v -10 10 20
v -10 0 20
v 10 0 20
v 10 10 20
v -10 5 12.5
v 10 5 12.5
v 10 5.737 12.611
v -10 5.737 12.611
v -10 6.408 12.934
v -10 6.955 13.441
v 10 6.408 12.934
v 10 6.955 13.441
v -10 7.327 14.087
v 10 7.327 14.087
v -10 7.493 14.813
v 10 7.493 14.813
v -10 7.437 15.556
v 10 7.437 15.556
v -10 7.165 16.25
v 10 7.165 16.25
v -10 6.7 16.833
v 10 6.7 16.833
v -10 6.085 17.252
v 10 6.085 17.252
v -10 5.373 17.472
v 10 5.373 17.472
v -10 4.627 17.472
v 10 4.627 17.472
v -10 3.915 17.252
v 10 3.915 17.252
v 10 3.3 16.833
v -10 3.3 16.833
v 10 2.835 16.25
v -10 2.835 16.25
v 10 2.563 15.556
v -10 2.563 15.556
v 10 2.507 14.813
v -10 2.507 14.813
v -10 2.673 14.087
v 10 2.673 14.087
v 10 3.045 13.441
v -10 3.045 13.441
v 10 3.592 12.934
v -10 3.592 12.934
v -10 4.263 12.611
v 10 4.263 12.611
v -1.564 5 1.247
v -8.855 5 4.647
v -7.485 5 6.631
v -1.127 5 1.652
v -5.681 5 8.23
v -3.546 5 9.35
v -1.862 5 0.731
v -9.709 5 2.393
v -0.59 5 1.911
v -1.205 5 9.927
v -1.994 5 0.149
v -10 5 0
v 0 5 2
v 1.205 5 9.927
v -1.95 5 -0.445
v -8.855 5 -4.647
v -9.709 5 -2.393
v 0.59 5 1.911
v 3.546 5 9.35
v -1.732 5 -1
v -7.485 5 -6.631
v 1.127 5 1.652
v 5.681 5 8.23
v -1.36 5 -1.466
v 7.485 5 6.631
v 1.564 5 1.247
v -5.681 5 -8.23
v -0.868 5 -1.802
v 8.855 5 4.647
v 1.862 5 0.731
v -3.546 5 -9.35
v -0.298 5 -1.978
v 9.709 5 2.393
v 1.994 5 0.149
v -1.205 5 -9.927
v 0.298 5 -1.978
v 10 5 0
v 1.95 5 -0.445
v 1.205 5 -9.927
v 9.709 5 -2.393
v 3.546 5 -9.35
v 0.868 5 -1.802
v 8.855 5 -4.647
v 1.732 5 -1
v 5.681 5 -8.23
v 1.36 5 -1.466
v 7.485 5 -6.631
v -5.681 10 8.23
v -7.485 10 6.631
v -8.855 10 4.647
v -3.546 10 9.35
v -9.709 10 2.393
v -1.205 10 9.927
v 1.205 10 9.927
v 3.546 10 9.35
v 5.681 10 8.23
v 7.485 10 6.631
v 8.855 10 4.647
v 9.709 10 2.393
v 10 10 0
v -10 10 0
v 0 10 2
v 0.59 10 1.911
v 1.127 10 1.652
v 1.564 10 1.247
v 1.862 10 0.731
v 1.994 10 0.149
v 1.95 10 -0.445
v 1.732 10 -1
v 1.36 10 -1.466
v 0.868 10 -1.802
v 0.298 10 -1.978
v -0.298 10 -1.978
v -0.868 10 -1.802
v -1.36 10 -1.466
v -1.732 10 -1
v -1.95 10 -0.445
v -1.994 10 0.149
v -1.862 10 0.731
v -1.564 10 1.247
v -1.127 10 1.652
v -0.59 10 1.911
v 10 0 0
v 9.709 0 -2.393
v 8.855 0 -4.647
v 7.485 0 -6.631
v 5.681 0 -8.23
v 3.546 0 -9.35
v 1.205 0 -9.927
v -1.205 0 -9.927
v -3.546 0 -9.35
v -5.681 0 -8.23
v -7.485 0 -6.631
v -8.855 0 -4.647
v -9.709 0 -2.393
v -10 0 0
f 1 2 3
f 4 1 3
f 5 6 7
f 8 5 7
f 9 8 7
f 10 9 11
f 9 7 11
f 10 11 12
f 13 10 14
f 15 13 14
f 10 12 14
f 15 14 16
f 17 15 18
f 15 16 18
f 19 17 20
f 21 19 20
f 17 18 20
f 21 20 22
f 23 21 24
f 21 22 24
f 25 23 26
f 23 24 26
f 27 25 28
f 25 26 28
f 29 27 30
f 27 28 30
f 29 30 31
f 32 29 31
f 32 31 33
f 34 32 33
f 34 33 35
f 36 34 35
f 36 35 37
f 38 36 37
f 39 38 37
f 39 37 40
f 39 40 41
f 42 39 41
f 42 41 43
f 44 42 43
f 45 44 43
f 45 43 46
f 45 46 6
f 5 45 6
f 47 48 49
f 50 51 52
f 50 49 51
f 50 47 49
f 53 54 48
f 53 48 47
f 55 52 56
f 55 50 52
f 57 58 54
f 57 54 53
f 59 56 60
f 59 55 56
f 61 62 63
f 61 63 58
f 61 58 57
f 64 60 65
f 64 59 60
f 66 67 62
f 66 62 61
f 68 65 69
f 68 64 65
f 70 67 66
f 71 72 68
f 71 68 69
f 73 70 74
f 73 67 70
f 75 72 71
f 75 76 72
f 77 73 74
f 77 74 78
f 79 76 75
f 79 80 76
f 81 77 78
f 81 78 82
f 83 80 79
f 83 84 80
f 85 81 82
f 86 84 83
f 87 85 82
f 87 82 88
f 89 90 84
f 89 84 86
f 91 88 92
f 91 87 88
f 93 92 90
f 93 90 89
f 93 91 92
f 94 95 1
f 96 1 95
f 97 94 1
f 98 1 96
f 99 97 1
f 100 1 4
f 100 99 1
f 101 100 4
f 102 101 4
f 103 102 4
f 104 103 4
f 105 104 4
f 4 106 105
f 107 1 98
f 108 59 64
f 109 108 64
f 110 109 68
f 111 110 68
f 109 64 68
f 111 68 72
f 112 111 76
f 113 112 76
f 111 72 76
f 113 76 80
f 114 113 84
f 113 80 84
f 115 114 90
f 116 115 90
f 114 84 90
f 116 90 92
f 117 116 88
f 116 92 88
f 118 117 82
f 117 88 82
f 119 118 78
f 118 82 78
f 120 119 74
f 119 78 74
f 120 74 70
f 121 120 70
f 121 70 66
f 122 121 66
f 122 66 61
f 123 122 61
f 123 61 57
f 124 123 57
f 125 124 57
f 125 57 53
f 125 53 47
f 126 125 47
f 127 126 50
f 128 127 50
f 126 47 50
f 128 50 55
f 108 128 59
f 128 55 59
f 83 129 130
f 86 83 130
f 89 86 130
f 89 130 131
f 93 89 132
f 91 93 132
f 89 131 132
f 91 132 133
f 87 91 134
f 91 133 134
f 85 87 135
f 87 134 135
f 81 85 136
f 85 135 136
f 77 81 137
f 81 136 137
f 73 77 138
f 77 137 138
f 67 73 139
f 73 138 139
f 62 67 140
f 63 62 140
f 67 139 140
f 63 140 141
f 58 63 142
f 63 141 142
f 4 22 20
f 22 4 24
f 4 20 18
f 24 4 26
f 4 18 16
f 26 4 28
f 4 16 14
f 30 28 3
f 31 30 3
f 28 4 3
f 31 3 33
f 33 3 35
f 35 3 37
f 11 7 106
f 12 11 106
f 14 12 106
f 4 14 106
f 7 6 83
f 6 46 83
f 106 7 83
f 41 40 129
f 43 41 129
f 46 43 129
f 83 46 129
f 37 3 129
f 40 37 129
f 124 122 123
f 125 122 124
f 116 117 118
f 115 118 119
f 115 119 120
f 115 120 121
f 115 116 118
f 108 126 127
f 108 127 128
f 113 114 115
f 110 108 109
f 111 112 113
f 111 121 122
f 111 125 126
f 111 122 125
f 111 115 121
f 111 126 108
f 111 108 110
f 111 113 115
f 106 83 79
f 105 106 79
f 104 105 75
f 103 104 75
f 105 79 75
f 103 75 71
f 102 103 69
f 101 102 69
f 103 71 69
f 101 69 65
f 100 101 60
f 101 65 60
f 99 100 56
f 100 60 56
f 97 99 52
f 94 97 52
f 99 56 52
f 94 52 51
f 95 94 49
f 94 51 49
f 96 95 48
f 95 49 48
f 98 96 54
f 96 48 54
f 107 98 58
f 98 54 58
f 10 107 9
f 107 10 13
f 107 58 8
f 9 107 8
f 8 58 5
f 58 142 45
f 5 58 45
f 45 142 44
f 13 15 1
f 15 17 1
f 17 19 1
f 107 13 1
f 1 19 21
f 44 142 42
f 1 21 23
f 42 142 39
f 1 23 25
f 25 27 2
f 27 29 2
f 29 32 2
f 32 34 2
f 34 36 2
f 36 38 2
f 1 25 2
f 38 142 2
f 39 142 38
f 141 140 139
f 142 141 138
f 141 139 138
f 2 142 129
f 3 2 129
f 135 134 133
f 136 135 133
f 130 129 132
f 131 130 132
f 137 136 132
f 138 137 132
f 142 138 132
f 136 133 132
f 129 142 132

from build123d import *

# Parameters (mm, degrees)
AUFSATZ_LINEAR_AUSTRAGEN1_DEPTH = 5
SKIZZE2_R                       = 2
AUFSATZ_LINEAR_AUSTRAGEN2_DEPTH = 5
SKIZZE3_R                       = 2.5
SCHNITT_LINEAR_AUSTRAGEN1_DEPTH = 31


with BuildPart() as part:
    # Skizze1 → Aufsatz-Linear austragen1 (new body)
    with BuildSketch(Plane(origin=(0, 0, 0), x_dir=(1, 0, 0), z_dir=(0, 1, 0))):
        with BuildLine():
            ThreePointArc((10, 0), (0, 10), (-10, 0))
            Line((-10, 0), (10, 0))
        make_face()
        with BuildLine():
            Line((10, 0), (-10, 0))
            ThreePointArc((-10, 0), (0, -10), (10, 0))
        make_face()
        with BuildLine():
            ThreePointArc((10, 0), (0, 10), (-10, 0))
            Line((-10, 0), (10, 0))
        make_face()
        with BuildLine():
            Line((10, 0), (-10, 0))
            ThreePointArc((-10, 0), (0, -10), (10, 0))
        make_face()
        with BuildLine():
            ThreePointArc((10, 0), (0, -10), (-10, 0))
            Line((-10, 0), (-10, -20))
            Line((-10, -20), (10, -20))
            Line((10, -20), (10, 0))
        make_face()
    extrude(amount=AUFSATZ_LINEAR_AUSTRAGEN1_DEPTH)

    # Skizze2 → Aufsatz-Linear austragen2 (add)
    with BuildSketch(Plane(origin=(0, 5, 0), x_dir=(1, 0, 0), z_dir=(0, 1, 0))):
        with Locations(Location((0, 0, 0), (0, 0, 270))):
            Circle(SKIZZE2_R)
        with BuildLine():
            Line((-10, -20), (10, -20))
            Line((10, -20), (10, 0))
            ThreePointArc((10, 0), (0, -10), (-10, 0))
            Line((-10, 0), (-10, -20))
        make_face()
    extrude(amount=AUFSATZ_LINEAR_AUSTRAGEN2_DEPTH)

    # Skizze3 → Schnitt-Linear austragen1 (cut, through all)
    with BuildSketch(Plane(origin=(10, 0, 0), x_dir=(0, 0, -1), z_dir=(1, 0, 0))):
        with Locations((-15, 5)):
            Circle(SKIZZE3_R)
    extrude(amount=-SCHNITT_LINEAR_AUSTRAGEN1_DEPTH, mode=Mode.SUBTRACT)


solid = part.part
